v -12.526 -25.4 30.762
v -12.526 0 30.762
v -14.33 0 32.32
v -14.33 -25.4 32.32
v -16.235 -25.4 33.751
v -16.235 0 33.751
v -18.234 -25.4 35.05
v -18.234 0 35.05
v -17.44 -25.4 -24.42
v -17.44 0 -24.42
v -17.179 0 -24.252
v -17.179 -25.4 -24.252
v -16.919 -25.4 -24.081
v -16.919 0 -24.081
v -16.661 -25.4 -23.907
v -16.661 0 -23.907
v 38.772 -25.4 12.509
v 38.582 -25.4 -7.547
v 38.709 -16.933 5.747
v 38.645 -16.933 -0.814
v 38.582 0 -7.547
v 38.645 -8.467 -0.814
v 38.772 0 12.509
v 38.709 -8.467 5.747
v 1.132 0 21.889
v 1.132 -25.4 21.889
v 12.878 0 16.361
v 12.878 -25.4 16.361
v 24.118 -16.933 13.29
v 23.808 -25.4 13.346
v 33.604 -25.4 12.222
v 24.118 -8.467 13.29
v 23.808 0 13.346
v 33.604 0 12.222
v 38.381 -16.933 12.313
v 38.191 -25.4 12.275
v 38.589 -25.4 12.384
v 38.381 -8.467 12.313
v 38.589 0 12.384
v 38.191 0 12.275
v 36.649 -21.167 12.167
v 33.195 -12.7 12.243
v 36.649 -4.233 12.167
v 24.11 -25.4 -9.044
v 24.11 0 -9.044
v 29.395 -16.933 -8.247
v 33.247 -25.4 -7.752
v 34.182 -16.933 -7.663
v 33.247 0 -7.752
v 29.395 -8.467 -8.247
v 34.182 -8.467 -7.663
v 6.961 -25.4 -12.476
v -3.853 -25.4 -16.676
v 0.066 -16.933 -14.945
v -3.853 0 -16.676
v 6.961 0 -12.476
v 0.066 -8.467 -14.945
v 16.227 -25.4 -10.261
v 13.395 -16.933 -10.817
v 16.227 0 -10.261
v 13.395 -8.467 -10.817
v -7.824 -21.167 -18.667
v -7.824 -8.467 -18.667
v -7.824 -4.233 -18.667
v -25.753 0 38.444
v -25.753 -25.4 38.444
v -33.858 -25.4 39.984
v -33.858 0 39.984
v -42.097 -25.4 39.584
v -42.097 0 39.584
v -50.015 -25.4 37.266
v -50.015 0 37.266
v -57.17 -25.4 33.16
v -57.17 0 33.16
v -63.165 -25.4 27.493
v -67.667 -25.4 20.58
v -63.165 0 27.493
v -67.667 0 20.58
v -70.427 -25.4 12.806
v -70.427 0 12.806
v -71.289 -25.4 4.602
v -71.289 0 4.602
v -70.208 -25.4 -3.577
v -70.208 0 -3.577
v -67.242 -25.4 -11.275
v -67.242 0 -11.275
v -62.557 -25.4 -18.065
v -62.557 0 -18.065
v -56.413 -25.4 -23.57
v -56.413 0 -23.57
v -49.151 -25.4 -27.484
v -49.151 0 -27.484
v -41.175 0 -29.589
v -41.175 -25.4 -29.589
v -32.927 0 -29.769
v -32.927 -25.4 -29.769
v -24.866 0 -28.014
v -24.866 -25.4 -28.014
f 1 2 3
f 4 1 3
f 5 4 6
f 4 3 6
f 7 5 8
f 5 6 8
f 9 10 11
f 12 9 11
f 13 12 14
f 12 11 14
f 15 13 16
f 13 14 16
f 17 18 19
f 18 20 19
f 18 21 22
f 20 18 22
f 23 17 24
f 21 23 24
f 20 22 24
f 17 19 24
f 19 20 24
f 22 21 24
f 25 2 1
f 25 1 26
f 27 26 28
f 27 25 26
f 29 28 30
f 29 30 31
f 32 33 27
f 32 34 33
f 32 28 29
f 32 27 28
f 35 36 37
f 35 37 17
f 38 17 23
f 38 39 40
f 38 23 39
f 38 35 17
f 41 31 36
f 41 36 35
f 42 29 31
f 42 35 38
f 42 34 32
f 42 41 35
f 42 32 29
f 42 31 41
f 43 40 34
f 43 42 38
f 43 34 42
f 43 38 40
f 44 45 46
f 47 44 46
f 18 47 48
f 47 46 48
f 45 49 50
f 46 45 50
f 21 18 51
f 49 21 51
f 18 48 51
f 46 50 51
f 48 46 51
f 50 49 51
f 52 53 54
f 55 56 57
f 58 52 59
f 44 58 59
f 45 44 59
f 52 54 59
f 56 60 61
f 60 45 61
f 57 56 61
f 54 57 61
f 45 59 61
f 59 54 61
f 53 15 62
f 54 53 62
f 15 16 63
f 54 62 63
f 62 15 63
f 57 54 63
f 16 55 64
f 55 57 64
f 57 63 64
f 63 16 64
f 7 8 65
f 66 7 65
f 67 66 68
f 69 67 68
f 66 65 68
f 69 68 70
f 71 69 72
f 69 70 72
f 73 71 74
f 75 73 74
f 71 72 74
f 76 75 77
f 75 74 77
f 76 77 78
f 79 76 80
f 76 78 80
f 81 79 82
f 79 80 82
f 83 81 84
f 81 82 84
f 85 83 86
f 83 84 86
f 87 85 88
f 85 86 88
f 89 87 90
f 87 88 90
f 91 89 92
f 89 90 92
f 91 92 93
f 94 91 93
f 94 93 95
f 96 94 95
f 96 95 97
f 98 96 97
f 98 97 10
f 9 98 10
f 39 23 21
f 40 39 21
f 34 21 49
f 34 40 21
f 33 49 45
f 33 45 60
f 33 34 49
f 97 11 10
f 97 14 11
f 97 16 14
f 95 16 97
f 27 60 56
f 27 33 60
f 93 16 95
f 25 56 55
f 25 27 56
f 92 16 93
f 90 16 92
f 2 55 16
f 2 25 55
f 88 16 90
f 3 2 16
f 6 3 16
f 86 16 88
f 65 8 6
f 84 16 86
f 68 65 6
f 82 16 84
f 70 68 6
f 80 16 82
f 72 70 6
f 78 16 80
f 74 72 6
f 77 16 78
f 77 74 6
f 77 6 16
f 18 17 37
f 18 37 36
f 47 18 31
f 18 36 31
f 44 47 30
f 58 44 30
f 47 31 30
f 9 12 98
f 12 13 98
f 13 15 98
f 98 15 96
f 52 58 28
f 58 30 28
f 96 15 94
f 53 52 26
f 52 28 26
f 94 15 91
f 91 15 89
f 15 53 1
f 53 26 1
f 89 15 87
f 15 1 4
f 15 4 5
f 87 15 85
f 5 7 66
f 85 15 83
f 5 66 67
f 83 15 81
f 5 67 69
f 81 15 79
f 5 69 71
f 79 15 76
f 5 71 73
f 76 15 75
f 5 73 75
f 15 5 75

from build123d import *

# Parameters (mm, degrees)
F1_DEPTH = 25.4


with BuildPart() as f1:
    # F0 (on Front) → F1 (new body)
    with BuildSketch(Plane.XZ):
        with BuildLine():
            add(Edge.make_bspline(
                [(-18.2338618332, 35.049978312), (-16.2634742331, 33.5219960414), (-14.3632449685, 32.0948882514), (-12.5260129681, 30.7620231507)],
                knots=[0, 0, 0, 0, 0.065741729, 0.065741729, 0.065741729, 0.065741729], degree=3))
            ThreePointArc((-18.2338618332, 35.049978312), (-71.2893804123, 4.6016135845), (-17.4403864611, -24.4203921477))
            add(Edge.make_bspline(
                [(-17.4403864611, -24.4203921477), (-17.179402441, -24.2472786453), (-16.9196286438, -24.0762946974), (-16.6610557268, -23.9074107575)],
                knots=[0, 0, 0, 0, 0.0086559059, 0.0086559059, 0.0086559059, 0.0086559059], degree=3))
            ThreePointArc((-16.6610557268, -23.9074107575), (-5.3724339888, -11.3311344475), (-1.2924953236, 5.0685547891))
            ThreePointArc((-1.2924953236, 5.0685547891), (-4.2236094492, 19.0894876674), (-12.5260129681, 30.7620231507))
        make_face()
        with BuildLine():
            ThreePointArc((-12.5260129681, 30.7620231507), (-15.2703232487, 33.0519120082), (-18.2338618332, 35.049978312))
            add(Edge.make_bspline(
                [(-18.2338618332, 35.049978312), (-16.2634742331, 33.5219960414), (-14.3632449685, 32.0948882514), (-12.5260129681, 30.7620231507)],
                knots=[0, 0, 0, 0, 0.065741729, 0.065741729, 0.065741729, 0.065741729], degree=3))
        make_face()
        with BuildLine():
            add(Edge.make_bspline(
                [(-17.4403864611, -24.4203921477), (-17.179402441, -24.2472786453), (-16.9196286438, -24.0762946974), (-16.6610557268, -23.9074107575)],
                knots=[0, 0, 0, 0, 0.0086559059, 0.0086559059, 0.0086559059, 0.0086559059], degree=3))
            ThreePointArc((-17.4403864611, -24.4203921477), (-17.0490116738, -24.1664984351), (-16.6610557268, -23.9074107575))
        make_face()
        with BuildLine():
            add(Edge.make_bspline(
                [(-12.5260129681, 30.7620231507), (2.638402042, 19.7606256484), (20.1903372376, 12.3655817594), (38.1732838608, 11.9589753306), (38.6908322584, 12.4428219154), (38.7721241334, 12.5086976901)],
                knots=[0.065741729, 0.065741729, 0.065741729, 0.065741729, 0.6083704565, 0.9417253051, 1, 1, 1, 1], degree=3))
            ThreePointArc((-12.5260129681, 30.7620231507), (-4.2236094492, 19.0894876674), (-1.2924953236, 5.0685547891))
            ThreePointArc((-1.2924953236, 5.0685547891), (-5.3724339888, -11.3311344475), (-16.6610557268, -23.9074107575))
            add(Edge.make_bspline(
                [(-16.6610557268, -23.9074107575), (2.0260763524, -11.7021244239), (14.4410223527, -10.4651605814), (24.1103417725, -9.0437679707)],
                knots=[0.0086559059, 0.0086559059, 0.0086559059, 0.0086559059, 0.6342204815, 0.6342204815, 0.6342204815, 0.6342204815], degree=3))
            add(Edge.make_bspline(
                [(24.1103417725, -9.0437679707), (29.6806384765, -8.2249328253), (34.3397507009, -7.3448917488), (38.5815591641, -7.5473355981)],
                knots=[0.6342204815, 0.6342204815, 0.6342204815, 0.6342204815, 0.9945954099, 0.9945954099, 0.9945954099, 0.9945954099], degree=3))
            add(Edge.make_bspline(
                [(38.5815591641, -7.5473355981), (38.6450808205, -0.6026015768), (38.708602477, 5.5213805001), (38.7721241334, 12.5086976901)],
                knots=[0.5076766633, 0.5076766633, 0.5076766633, 0.5076766633, 20.5853675478, 20.5853675478, 20.5853675478, 20.5853675478], degree=3))
        make_face()
    extrude(amount=F1_DEPTH)


solid = f1.part
